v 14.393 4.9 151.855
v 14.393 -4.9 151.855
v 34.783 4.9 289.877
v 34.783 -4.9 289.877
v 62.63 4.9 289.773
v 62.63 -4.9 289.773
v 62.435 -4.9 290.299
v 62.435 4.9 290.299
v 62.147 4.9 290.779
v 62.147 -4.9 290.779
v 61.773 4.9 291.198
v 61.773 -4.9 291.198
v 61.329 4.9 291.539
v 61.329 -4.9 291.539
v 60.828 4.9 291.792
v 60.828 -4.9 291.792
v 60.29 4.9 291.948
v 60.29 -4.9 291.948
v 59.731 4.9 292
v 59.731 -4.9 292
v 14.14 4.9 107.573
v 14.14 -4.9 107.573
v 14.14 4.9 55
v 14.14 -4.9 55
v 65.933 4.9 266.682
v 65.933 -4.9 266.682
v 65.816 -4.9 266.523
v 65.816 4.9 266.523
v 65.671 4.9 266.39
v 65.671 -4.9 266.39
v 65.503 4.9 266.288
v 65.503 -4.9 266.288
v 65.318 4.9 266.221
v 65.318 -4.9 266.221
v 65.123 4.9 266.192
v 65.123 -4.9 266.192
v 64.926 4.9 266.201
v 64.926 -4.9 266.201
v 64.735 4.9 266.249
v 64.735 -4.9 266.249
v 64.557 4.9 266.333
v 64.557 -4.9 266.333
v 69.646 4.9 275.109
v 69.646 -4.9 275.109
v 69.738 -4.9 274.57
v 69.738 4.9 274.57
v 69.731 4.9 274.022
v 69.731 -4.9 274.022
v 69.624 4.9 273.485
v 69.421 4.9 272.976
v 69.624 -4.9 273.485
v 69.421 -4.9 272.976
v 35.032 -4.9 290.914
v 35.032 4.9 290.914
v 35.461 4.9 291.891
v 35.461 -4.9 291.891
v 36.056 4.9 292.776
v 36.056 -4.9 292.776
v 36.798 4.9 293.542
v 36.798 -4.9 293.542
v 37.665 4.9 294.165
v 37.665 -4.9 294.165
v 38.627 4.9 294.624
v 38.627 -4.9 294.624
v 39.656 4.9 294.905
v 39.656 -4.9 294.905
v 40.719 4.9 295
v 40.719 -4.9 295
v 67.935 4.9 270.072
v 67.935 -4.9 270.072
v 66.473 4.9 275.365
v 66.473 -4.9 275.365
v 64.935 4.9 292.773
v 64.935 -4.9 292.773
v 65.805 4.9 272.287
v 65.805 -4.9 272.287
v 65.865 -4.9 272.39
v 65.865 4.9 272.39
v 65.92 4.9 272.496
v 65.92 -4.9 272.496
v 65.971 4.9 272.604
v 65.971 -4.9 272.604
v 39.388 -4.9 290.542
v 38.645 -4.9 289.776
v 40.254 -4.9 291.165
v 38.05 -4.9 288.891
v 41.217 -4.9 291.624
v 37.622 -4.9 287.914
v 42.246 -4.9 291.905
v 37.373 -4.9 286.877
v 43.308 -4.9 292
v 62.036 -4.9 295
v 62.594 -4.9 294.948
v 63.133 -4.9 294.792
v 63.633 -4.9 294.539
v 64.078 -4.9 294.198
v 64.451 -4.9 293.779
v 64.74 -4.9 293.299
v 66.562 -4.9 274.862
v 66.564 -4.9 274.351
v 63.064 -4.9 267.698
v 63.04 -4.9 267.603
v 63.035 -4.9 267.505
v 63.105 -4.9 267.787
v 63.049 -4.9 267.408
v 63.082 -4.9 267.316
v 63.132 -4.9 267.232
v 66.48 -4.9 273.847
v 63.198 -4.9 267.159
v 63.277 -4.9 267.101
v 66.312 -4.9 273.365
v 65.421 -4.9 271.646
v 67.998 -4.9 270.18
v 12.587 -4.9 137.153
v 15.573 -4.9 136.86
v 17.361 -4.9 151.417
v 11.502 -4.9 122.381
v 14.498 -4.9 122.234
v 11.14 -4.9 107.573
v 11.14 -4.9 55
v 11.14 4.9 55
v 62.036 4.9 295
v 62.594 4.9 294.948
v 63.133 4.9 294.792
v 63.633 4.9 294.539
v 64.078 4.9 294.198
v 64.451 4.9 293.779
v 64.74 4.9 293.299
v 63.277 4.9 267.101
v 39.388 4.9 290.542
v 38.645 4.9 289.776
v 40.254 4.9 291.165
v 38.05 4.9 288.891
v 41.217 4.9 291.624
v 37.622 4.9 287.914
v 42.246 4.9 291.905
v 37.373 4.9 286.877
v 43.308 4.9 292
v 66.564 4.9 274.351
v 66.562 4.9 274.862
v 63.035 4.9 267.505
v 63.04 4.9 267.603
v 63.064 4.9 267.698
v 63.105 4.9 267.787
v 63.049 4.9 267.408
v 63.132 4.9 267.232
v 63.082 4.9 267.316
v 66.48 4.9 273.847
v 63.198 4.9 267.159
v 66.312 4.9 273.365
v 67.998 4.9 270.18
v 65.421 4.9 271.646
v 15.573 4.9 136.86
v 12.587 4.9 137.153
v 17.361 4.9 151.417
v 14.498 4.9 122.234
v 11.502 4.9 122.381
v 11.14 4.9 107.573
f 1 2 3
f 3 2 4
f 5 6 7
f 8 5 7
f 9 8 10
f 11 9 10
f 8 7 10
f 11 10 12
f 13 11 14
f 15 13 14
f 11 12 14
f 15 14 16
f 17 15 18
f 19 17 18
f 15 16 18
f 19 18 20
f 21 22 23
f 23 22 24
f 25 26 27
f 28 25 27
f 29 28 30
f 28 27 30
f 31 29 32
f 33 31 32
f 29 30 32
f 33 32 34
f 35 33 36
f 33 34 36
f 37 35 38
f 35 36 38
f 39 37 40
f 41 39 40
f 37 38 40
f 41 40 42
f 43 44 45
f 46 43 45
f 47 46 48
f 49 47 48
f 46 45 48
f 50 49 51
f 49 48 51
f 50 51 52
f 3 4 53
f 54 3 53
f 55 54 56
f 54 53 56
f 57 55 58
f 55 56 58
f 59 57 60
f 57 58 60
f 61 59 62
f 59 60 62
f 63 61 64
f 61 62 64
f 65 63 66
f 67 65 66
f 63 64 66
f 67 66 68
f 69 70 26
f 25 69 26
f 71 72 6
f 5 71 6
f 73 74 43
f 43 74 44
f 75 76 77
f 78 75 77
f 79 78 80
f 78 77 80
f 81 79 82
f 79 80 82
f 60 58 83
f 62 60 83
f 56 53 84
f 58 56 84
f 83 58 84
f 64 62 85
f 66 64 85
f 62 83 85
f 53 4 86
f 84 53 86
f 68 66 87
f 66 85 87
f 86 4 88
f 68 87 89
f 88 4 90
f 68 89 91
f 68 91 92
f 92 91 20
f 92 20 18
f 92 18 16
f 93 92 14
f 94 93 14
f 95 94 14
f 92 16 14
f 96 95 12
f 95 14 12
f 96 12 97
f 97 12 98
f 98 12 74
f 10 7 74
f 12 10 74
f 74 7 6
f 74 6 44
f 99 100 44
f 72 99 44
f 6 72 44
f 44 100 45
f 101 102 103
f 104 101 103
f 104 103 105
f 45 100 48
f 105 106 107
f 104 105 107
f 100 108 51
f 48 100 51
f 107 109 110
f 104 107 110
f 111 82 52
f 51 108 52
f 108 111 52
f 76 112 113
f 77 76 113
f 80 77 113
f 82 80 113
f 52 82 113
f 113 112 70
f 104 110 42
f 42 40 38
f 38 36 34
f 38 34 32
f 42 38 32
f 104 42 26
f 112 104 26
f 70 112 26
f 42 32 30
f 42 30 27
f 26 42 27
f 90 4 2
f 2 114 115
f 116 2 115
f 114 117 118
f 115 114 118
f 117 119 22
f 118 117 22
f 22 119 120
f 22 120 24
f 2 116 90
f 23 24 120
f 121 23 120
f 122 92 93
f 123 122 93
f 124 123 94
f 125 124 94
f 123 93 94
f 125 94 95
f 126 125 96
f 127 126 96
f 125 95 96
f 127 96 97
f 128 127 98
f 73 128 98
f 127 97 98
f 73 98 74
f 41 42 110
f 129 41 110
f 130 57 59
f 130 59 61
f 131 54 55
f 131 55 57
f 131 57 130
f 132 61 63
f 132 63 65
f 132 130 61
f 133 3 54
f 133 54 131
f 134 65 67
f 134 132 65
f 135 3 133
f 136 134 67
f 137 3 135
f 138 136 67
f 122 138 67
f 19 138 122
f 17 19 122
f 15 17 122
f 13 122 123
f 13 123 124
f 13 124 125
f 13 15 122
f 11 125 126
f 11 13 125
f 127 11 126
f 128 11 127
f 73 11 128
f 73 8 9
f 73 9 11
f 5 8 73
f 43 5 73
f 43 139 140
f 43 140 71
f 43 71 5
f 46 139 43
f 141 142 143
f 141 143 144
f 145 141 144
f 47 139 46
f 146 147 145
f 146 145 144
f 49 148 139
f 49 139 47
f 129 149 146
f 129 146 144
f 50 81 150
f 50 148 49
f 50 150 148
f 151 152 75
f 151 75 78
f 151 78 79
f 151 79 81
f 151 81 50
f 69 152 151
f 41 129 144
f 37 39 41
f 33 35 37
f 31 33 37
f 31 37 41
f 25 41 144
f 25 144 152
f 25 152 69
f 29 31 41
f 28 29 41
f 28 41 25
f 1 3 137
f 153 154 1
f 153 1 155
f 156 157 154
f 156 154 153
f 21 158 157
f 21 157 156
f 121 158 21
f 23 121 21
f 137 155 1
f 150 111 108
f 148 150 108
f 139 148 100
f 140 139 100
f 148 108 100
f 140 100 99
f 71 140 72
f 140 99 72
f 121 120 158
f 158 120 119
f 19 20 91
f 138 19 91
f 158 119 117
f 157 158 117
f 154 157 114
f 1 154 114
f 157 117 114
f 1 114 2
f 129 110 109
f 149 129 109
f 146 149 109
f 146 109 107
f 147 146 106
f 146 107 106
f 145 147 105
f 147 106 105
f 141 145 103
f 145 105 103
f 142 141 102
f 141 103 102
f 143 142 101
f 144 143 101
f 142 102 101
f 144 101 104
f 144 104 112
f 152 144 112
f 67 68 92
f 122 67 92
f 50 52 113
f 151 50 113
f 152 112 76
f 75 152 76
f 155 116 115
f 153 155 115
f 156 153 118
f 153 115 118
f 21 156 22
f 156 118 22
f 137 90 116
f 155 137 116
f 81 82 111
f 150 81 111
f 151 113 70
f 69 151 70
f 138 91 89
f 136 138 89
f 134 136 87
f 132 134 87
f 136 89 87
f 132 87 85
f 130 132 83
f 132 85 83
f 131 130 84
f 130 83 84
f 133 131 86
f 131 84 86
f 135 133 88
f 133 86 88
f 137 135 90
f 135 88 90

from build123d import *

# Parameters (mm, degrees)
BOSS_EXTRUDE1_DEPTH      = 4.9
BOSS_EXTRUDE1_DEPTH_BACK = 4.9


with BuildPart() as part:
    # Sketch1 → Boss-Extrude1 (new, two sides: drawn at the far end of the back side and taken through both)
    with BuildSketch(Plane(origin=(0, 0, 0), x_dir=(1, 0, 0), z_dir=(0, 1, 0)).offset(-BOSS_EXTRUDE1_DEPTH_BACK)):
        with BuildLine():
            Line((14.139704236, -107.57296828), (14.139704236, -55))
            Line((14.139704236, -55), (11.139704236, -55))
            Line((11.139704236, -55), (11.139704236, -107.57296828))
            ThreePointArc((11.139704236, -107.57296828), (11.954116062, -129.773650702), (14.392973543, -151.854989901))
            Line((14.392973543, -151.854989901), (34.78314741, -289.876871715))
            ThreePointArc((34.78314741, -289.876871715), (36.798345533, -293.542093696), (40.718726235, -295))
            Line((40.718726235, -295), (62.036020432, -295))
            ThreePointArc((62.036020432, -295), (63.863676368, -294.379006889), (64.934691141, -292.773115853))
            Line((64.934691141, -292.773115853), (69.645825561, -275.109492351))
            ThreePointArc((69.645825561, -275.109492351), (69.730627927, -274.02191122), (69.420940845, -272.975910231))
            Line((69.420940845, -272.975910231), (67.998466185, -270.180256335))
            Line((67.998466185, -270.180256335), (67.934740393, -270.07233274))
            Line((67.934740393, -270.07233274), (65.932760352, -266.681854911))
            ThreePointArc((65.932760352, -266.681854911), (65.317615772, -266.221021537), (64.557173026, -266.332811892))
            Line((64.557173026, -266.332811892), (63.276988126, -267.100922833))
            ThreePointArc((63.276988126, -267.100922833), (63.049164753, -267.408401483), (63.10548954, -267.786917173))
            Line((63.10548954, -267.786917173), (65.42072044, -271.645635339))
            Line((65.42072044, -271.645635339), (65.805438483, -272.286832078))
            ThreePointArc((65.805438483, -272.286832078), (65.89276832, -272.442724972), (65.970662013, -272.603540604))
            Line((65.970662013, -272.603540604), (66.311869933, -273.364986559))
            ThreePointArc((66.311869933, -273.364986559), (66.564497004, -274.351078344), (66.472838335, -275.364881152))
            Line((66.472838335, -275.364881152), (62.629961452, -289.773115853))
            ThreePointArc((62.629961452, -289.773115853), (61.558946679, -291.379006889), (59.731290743, -292))
            Line((59.731290743, -292), (43.308092042, -292))
            ThreePointArc((43.308092042, -292), (39.387711339, -290.542093696), (37.372513216, -286.876871715))
            Line((37.372513216, -286.876871715), (17.360762956, -151.416554044))
            ThreePointArc((17.360762956, -151.416554044), (14.946052579, -129.553841965), (14.139704236, -107.57296828))
        make_face()
    extrude(amount=BOSS_EXTRUDE1_DEPTH + BOSS_EXTRUDE1_DEPTH_BACK)


solid = part.part
